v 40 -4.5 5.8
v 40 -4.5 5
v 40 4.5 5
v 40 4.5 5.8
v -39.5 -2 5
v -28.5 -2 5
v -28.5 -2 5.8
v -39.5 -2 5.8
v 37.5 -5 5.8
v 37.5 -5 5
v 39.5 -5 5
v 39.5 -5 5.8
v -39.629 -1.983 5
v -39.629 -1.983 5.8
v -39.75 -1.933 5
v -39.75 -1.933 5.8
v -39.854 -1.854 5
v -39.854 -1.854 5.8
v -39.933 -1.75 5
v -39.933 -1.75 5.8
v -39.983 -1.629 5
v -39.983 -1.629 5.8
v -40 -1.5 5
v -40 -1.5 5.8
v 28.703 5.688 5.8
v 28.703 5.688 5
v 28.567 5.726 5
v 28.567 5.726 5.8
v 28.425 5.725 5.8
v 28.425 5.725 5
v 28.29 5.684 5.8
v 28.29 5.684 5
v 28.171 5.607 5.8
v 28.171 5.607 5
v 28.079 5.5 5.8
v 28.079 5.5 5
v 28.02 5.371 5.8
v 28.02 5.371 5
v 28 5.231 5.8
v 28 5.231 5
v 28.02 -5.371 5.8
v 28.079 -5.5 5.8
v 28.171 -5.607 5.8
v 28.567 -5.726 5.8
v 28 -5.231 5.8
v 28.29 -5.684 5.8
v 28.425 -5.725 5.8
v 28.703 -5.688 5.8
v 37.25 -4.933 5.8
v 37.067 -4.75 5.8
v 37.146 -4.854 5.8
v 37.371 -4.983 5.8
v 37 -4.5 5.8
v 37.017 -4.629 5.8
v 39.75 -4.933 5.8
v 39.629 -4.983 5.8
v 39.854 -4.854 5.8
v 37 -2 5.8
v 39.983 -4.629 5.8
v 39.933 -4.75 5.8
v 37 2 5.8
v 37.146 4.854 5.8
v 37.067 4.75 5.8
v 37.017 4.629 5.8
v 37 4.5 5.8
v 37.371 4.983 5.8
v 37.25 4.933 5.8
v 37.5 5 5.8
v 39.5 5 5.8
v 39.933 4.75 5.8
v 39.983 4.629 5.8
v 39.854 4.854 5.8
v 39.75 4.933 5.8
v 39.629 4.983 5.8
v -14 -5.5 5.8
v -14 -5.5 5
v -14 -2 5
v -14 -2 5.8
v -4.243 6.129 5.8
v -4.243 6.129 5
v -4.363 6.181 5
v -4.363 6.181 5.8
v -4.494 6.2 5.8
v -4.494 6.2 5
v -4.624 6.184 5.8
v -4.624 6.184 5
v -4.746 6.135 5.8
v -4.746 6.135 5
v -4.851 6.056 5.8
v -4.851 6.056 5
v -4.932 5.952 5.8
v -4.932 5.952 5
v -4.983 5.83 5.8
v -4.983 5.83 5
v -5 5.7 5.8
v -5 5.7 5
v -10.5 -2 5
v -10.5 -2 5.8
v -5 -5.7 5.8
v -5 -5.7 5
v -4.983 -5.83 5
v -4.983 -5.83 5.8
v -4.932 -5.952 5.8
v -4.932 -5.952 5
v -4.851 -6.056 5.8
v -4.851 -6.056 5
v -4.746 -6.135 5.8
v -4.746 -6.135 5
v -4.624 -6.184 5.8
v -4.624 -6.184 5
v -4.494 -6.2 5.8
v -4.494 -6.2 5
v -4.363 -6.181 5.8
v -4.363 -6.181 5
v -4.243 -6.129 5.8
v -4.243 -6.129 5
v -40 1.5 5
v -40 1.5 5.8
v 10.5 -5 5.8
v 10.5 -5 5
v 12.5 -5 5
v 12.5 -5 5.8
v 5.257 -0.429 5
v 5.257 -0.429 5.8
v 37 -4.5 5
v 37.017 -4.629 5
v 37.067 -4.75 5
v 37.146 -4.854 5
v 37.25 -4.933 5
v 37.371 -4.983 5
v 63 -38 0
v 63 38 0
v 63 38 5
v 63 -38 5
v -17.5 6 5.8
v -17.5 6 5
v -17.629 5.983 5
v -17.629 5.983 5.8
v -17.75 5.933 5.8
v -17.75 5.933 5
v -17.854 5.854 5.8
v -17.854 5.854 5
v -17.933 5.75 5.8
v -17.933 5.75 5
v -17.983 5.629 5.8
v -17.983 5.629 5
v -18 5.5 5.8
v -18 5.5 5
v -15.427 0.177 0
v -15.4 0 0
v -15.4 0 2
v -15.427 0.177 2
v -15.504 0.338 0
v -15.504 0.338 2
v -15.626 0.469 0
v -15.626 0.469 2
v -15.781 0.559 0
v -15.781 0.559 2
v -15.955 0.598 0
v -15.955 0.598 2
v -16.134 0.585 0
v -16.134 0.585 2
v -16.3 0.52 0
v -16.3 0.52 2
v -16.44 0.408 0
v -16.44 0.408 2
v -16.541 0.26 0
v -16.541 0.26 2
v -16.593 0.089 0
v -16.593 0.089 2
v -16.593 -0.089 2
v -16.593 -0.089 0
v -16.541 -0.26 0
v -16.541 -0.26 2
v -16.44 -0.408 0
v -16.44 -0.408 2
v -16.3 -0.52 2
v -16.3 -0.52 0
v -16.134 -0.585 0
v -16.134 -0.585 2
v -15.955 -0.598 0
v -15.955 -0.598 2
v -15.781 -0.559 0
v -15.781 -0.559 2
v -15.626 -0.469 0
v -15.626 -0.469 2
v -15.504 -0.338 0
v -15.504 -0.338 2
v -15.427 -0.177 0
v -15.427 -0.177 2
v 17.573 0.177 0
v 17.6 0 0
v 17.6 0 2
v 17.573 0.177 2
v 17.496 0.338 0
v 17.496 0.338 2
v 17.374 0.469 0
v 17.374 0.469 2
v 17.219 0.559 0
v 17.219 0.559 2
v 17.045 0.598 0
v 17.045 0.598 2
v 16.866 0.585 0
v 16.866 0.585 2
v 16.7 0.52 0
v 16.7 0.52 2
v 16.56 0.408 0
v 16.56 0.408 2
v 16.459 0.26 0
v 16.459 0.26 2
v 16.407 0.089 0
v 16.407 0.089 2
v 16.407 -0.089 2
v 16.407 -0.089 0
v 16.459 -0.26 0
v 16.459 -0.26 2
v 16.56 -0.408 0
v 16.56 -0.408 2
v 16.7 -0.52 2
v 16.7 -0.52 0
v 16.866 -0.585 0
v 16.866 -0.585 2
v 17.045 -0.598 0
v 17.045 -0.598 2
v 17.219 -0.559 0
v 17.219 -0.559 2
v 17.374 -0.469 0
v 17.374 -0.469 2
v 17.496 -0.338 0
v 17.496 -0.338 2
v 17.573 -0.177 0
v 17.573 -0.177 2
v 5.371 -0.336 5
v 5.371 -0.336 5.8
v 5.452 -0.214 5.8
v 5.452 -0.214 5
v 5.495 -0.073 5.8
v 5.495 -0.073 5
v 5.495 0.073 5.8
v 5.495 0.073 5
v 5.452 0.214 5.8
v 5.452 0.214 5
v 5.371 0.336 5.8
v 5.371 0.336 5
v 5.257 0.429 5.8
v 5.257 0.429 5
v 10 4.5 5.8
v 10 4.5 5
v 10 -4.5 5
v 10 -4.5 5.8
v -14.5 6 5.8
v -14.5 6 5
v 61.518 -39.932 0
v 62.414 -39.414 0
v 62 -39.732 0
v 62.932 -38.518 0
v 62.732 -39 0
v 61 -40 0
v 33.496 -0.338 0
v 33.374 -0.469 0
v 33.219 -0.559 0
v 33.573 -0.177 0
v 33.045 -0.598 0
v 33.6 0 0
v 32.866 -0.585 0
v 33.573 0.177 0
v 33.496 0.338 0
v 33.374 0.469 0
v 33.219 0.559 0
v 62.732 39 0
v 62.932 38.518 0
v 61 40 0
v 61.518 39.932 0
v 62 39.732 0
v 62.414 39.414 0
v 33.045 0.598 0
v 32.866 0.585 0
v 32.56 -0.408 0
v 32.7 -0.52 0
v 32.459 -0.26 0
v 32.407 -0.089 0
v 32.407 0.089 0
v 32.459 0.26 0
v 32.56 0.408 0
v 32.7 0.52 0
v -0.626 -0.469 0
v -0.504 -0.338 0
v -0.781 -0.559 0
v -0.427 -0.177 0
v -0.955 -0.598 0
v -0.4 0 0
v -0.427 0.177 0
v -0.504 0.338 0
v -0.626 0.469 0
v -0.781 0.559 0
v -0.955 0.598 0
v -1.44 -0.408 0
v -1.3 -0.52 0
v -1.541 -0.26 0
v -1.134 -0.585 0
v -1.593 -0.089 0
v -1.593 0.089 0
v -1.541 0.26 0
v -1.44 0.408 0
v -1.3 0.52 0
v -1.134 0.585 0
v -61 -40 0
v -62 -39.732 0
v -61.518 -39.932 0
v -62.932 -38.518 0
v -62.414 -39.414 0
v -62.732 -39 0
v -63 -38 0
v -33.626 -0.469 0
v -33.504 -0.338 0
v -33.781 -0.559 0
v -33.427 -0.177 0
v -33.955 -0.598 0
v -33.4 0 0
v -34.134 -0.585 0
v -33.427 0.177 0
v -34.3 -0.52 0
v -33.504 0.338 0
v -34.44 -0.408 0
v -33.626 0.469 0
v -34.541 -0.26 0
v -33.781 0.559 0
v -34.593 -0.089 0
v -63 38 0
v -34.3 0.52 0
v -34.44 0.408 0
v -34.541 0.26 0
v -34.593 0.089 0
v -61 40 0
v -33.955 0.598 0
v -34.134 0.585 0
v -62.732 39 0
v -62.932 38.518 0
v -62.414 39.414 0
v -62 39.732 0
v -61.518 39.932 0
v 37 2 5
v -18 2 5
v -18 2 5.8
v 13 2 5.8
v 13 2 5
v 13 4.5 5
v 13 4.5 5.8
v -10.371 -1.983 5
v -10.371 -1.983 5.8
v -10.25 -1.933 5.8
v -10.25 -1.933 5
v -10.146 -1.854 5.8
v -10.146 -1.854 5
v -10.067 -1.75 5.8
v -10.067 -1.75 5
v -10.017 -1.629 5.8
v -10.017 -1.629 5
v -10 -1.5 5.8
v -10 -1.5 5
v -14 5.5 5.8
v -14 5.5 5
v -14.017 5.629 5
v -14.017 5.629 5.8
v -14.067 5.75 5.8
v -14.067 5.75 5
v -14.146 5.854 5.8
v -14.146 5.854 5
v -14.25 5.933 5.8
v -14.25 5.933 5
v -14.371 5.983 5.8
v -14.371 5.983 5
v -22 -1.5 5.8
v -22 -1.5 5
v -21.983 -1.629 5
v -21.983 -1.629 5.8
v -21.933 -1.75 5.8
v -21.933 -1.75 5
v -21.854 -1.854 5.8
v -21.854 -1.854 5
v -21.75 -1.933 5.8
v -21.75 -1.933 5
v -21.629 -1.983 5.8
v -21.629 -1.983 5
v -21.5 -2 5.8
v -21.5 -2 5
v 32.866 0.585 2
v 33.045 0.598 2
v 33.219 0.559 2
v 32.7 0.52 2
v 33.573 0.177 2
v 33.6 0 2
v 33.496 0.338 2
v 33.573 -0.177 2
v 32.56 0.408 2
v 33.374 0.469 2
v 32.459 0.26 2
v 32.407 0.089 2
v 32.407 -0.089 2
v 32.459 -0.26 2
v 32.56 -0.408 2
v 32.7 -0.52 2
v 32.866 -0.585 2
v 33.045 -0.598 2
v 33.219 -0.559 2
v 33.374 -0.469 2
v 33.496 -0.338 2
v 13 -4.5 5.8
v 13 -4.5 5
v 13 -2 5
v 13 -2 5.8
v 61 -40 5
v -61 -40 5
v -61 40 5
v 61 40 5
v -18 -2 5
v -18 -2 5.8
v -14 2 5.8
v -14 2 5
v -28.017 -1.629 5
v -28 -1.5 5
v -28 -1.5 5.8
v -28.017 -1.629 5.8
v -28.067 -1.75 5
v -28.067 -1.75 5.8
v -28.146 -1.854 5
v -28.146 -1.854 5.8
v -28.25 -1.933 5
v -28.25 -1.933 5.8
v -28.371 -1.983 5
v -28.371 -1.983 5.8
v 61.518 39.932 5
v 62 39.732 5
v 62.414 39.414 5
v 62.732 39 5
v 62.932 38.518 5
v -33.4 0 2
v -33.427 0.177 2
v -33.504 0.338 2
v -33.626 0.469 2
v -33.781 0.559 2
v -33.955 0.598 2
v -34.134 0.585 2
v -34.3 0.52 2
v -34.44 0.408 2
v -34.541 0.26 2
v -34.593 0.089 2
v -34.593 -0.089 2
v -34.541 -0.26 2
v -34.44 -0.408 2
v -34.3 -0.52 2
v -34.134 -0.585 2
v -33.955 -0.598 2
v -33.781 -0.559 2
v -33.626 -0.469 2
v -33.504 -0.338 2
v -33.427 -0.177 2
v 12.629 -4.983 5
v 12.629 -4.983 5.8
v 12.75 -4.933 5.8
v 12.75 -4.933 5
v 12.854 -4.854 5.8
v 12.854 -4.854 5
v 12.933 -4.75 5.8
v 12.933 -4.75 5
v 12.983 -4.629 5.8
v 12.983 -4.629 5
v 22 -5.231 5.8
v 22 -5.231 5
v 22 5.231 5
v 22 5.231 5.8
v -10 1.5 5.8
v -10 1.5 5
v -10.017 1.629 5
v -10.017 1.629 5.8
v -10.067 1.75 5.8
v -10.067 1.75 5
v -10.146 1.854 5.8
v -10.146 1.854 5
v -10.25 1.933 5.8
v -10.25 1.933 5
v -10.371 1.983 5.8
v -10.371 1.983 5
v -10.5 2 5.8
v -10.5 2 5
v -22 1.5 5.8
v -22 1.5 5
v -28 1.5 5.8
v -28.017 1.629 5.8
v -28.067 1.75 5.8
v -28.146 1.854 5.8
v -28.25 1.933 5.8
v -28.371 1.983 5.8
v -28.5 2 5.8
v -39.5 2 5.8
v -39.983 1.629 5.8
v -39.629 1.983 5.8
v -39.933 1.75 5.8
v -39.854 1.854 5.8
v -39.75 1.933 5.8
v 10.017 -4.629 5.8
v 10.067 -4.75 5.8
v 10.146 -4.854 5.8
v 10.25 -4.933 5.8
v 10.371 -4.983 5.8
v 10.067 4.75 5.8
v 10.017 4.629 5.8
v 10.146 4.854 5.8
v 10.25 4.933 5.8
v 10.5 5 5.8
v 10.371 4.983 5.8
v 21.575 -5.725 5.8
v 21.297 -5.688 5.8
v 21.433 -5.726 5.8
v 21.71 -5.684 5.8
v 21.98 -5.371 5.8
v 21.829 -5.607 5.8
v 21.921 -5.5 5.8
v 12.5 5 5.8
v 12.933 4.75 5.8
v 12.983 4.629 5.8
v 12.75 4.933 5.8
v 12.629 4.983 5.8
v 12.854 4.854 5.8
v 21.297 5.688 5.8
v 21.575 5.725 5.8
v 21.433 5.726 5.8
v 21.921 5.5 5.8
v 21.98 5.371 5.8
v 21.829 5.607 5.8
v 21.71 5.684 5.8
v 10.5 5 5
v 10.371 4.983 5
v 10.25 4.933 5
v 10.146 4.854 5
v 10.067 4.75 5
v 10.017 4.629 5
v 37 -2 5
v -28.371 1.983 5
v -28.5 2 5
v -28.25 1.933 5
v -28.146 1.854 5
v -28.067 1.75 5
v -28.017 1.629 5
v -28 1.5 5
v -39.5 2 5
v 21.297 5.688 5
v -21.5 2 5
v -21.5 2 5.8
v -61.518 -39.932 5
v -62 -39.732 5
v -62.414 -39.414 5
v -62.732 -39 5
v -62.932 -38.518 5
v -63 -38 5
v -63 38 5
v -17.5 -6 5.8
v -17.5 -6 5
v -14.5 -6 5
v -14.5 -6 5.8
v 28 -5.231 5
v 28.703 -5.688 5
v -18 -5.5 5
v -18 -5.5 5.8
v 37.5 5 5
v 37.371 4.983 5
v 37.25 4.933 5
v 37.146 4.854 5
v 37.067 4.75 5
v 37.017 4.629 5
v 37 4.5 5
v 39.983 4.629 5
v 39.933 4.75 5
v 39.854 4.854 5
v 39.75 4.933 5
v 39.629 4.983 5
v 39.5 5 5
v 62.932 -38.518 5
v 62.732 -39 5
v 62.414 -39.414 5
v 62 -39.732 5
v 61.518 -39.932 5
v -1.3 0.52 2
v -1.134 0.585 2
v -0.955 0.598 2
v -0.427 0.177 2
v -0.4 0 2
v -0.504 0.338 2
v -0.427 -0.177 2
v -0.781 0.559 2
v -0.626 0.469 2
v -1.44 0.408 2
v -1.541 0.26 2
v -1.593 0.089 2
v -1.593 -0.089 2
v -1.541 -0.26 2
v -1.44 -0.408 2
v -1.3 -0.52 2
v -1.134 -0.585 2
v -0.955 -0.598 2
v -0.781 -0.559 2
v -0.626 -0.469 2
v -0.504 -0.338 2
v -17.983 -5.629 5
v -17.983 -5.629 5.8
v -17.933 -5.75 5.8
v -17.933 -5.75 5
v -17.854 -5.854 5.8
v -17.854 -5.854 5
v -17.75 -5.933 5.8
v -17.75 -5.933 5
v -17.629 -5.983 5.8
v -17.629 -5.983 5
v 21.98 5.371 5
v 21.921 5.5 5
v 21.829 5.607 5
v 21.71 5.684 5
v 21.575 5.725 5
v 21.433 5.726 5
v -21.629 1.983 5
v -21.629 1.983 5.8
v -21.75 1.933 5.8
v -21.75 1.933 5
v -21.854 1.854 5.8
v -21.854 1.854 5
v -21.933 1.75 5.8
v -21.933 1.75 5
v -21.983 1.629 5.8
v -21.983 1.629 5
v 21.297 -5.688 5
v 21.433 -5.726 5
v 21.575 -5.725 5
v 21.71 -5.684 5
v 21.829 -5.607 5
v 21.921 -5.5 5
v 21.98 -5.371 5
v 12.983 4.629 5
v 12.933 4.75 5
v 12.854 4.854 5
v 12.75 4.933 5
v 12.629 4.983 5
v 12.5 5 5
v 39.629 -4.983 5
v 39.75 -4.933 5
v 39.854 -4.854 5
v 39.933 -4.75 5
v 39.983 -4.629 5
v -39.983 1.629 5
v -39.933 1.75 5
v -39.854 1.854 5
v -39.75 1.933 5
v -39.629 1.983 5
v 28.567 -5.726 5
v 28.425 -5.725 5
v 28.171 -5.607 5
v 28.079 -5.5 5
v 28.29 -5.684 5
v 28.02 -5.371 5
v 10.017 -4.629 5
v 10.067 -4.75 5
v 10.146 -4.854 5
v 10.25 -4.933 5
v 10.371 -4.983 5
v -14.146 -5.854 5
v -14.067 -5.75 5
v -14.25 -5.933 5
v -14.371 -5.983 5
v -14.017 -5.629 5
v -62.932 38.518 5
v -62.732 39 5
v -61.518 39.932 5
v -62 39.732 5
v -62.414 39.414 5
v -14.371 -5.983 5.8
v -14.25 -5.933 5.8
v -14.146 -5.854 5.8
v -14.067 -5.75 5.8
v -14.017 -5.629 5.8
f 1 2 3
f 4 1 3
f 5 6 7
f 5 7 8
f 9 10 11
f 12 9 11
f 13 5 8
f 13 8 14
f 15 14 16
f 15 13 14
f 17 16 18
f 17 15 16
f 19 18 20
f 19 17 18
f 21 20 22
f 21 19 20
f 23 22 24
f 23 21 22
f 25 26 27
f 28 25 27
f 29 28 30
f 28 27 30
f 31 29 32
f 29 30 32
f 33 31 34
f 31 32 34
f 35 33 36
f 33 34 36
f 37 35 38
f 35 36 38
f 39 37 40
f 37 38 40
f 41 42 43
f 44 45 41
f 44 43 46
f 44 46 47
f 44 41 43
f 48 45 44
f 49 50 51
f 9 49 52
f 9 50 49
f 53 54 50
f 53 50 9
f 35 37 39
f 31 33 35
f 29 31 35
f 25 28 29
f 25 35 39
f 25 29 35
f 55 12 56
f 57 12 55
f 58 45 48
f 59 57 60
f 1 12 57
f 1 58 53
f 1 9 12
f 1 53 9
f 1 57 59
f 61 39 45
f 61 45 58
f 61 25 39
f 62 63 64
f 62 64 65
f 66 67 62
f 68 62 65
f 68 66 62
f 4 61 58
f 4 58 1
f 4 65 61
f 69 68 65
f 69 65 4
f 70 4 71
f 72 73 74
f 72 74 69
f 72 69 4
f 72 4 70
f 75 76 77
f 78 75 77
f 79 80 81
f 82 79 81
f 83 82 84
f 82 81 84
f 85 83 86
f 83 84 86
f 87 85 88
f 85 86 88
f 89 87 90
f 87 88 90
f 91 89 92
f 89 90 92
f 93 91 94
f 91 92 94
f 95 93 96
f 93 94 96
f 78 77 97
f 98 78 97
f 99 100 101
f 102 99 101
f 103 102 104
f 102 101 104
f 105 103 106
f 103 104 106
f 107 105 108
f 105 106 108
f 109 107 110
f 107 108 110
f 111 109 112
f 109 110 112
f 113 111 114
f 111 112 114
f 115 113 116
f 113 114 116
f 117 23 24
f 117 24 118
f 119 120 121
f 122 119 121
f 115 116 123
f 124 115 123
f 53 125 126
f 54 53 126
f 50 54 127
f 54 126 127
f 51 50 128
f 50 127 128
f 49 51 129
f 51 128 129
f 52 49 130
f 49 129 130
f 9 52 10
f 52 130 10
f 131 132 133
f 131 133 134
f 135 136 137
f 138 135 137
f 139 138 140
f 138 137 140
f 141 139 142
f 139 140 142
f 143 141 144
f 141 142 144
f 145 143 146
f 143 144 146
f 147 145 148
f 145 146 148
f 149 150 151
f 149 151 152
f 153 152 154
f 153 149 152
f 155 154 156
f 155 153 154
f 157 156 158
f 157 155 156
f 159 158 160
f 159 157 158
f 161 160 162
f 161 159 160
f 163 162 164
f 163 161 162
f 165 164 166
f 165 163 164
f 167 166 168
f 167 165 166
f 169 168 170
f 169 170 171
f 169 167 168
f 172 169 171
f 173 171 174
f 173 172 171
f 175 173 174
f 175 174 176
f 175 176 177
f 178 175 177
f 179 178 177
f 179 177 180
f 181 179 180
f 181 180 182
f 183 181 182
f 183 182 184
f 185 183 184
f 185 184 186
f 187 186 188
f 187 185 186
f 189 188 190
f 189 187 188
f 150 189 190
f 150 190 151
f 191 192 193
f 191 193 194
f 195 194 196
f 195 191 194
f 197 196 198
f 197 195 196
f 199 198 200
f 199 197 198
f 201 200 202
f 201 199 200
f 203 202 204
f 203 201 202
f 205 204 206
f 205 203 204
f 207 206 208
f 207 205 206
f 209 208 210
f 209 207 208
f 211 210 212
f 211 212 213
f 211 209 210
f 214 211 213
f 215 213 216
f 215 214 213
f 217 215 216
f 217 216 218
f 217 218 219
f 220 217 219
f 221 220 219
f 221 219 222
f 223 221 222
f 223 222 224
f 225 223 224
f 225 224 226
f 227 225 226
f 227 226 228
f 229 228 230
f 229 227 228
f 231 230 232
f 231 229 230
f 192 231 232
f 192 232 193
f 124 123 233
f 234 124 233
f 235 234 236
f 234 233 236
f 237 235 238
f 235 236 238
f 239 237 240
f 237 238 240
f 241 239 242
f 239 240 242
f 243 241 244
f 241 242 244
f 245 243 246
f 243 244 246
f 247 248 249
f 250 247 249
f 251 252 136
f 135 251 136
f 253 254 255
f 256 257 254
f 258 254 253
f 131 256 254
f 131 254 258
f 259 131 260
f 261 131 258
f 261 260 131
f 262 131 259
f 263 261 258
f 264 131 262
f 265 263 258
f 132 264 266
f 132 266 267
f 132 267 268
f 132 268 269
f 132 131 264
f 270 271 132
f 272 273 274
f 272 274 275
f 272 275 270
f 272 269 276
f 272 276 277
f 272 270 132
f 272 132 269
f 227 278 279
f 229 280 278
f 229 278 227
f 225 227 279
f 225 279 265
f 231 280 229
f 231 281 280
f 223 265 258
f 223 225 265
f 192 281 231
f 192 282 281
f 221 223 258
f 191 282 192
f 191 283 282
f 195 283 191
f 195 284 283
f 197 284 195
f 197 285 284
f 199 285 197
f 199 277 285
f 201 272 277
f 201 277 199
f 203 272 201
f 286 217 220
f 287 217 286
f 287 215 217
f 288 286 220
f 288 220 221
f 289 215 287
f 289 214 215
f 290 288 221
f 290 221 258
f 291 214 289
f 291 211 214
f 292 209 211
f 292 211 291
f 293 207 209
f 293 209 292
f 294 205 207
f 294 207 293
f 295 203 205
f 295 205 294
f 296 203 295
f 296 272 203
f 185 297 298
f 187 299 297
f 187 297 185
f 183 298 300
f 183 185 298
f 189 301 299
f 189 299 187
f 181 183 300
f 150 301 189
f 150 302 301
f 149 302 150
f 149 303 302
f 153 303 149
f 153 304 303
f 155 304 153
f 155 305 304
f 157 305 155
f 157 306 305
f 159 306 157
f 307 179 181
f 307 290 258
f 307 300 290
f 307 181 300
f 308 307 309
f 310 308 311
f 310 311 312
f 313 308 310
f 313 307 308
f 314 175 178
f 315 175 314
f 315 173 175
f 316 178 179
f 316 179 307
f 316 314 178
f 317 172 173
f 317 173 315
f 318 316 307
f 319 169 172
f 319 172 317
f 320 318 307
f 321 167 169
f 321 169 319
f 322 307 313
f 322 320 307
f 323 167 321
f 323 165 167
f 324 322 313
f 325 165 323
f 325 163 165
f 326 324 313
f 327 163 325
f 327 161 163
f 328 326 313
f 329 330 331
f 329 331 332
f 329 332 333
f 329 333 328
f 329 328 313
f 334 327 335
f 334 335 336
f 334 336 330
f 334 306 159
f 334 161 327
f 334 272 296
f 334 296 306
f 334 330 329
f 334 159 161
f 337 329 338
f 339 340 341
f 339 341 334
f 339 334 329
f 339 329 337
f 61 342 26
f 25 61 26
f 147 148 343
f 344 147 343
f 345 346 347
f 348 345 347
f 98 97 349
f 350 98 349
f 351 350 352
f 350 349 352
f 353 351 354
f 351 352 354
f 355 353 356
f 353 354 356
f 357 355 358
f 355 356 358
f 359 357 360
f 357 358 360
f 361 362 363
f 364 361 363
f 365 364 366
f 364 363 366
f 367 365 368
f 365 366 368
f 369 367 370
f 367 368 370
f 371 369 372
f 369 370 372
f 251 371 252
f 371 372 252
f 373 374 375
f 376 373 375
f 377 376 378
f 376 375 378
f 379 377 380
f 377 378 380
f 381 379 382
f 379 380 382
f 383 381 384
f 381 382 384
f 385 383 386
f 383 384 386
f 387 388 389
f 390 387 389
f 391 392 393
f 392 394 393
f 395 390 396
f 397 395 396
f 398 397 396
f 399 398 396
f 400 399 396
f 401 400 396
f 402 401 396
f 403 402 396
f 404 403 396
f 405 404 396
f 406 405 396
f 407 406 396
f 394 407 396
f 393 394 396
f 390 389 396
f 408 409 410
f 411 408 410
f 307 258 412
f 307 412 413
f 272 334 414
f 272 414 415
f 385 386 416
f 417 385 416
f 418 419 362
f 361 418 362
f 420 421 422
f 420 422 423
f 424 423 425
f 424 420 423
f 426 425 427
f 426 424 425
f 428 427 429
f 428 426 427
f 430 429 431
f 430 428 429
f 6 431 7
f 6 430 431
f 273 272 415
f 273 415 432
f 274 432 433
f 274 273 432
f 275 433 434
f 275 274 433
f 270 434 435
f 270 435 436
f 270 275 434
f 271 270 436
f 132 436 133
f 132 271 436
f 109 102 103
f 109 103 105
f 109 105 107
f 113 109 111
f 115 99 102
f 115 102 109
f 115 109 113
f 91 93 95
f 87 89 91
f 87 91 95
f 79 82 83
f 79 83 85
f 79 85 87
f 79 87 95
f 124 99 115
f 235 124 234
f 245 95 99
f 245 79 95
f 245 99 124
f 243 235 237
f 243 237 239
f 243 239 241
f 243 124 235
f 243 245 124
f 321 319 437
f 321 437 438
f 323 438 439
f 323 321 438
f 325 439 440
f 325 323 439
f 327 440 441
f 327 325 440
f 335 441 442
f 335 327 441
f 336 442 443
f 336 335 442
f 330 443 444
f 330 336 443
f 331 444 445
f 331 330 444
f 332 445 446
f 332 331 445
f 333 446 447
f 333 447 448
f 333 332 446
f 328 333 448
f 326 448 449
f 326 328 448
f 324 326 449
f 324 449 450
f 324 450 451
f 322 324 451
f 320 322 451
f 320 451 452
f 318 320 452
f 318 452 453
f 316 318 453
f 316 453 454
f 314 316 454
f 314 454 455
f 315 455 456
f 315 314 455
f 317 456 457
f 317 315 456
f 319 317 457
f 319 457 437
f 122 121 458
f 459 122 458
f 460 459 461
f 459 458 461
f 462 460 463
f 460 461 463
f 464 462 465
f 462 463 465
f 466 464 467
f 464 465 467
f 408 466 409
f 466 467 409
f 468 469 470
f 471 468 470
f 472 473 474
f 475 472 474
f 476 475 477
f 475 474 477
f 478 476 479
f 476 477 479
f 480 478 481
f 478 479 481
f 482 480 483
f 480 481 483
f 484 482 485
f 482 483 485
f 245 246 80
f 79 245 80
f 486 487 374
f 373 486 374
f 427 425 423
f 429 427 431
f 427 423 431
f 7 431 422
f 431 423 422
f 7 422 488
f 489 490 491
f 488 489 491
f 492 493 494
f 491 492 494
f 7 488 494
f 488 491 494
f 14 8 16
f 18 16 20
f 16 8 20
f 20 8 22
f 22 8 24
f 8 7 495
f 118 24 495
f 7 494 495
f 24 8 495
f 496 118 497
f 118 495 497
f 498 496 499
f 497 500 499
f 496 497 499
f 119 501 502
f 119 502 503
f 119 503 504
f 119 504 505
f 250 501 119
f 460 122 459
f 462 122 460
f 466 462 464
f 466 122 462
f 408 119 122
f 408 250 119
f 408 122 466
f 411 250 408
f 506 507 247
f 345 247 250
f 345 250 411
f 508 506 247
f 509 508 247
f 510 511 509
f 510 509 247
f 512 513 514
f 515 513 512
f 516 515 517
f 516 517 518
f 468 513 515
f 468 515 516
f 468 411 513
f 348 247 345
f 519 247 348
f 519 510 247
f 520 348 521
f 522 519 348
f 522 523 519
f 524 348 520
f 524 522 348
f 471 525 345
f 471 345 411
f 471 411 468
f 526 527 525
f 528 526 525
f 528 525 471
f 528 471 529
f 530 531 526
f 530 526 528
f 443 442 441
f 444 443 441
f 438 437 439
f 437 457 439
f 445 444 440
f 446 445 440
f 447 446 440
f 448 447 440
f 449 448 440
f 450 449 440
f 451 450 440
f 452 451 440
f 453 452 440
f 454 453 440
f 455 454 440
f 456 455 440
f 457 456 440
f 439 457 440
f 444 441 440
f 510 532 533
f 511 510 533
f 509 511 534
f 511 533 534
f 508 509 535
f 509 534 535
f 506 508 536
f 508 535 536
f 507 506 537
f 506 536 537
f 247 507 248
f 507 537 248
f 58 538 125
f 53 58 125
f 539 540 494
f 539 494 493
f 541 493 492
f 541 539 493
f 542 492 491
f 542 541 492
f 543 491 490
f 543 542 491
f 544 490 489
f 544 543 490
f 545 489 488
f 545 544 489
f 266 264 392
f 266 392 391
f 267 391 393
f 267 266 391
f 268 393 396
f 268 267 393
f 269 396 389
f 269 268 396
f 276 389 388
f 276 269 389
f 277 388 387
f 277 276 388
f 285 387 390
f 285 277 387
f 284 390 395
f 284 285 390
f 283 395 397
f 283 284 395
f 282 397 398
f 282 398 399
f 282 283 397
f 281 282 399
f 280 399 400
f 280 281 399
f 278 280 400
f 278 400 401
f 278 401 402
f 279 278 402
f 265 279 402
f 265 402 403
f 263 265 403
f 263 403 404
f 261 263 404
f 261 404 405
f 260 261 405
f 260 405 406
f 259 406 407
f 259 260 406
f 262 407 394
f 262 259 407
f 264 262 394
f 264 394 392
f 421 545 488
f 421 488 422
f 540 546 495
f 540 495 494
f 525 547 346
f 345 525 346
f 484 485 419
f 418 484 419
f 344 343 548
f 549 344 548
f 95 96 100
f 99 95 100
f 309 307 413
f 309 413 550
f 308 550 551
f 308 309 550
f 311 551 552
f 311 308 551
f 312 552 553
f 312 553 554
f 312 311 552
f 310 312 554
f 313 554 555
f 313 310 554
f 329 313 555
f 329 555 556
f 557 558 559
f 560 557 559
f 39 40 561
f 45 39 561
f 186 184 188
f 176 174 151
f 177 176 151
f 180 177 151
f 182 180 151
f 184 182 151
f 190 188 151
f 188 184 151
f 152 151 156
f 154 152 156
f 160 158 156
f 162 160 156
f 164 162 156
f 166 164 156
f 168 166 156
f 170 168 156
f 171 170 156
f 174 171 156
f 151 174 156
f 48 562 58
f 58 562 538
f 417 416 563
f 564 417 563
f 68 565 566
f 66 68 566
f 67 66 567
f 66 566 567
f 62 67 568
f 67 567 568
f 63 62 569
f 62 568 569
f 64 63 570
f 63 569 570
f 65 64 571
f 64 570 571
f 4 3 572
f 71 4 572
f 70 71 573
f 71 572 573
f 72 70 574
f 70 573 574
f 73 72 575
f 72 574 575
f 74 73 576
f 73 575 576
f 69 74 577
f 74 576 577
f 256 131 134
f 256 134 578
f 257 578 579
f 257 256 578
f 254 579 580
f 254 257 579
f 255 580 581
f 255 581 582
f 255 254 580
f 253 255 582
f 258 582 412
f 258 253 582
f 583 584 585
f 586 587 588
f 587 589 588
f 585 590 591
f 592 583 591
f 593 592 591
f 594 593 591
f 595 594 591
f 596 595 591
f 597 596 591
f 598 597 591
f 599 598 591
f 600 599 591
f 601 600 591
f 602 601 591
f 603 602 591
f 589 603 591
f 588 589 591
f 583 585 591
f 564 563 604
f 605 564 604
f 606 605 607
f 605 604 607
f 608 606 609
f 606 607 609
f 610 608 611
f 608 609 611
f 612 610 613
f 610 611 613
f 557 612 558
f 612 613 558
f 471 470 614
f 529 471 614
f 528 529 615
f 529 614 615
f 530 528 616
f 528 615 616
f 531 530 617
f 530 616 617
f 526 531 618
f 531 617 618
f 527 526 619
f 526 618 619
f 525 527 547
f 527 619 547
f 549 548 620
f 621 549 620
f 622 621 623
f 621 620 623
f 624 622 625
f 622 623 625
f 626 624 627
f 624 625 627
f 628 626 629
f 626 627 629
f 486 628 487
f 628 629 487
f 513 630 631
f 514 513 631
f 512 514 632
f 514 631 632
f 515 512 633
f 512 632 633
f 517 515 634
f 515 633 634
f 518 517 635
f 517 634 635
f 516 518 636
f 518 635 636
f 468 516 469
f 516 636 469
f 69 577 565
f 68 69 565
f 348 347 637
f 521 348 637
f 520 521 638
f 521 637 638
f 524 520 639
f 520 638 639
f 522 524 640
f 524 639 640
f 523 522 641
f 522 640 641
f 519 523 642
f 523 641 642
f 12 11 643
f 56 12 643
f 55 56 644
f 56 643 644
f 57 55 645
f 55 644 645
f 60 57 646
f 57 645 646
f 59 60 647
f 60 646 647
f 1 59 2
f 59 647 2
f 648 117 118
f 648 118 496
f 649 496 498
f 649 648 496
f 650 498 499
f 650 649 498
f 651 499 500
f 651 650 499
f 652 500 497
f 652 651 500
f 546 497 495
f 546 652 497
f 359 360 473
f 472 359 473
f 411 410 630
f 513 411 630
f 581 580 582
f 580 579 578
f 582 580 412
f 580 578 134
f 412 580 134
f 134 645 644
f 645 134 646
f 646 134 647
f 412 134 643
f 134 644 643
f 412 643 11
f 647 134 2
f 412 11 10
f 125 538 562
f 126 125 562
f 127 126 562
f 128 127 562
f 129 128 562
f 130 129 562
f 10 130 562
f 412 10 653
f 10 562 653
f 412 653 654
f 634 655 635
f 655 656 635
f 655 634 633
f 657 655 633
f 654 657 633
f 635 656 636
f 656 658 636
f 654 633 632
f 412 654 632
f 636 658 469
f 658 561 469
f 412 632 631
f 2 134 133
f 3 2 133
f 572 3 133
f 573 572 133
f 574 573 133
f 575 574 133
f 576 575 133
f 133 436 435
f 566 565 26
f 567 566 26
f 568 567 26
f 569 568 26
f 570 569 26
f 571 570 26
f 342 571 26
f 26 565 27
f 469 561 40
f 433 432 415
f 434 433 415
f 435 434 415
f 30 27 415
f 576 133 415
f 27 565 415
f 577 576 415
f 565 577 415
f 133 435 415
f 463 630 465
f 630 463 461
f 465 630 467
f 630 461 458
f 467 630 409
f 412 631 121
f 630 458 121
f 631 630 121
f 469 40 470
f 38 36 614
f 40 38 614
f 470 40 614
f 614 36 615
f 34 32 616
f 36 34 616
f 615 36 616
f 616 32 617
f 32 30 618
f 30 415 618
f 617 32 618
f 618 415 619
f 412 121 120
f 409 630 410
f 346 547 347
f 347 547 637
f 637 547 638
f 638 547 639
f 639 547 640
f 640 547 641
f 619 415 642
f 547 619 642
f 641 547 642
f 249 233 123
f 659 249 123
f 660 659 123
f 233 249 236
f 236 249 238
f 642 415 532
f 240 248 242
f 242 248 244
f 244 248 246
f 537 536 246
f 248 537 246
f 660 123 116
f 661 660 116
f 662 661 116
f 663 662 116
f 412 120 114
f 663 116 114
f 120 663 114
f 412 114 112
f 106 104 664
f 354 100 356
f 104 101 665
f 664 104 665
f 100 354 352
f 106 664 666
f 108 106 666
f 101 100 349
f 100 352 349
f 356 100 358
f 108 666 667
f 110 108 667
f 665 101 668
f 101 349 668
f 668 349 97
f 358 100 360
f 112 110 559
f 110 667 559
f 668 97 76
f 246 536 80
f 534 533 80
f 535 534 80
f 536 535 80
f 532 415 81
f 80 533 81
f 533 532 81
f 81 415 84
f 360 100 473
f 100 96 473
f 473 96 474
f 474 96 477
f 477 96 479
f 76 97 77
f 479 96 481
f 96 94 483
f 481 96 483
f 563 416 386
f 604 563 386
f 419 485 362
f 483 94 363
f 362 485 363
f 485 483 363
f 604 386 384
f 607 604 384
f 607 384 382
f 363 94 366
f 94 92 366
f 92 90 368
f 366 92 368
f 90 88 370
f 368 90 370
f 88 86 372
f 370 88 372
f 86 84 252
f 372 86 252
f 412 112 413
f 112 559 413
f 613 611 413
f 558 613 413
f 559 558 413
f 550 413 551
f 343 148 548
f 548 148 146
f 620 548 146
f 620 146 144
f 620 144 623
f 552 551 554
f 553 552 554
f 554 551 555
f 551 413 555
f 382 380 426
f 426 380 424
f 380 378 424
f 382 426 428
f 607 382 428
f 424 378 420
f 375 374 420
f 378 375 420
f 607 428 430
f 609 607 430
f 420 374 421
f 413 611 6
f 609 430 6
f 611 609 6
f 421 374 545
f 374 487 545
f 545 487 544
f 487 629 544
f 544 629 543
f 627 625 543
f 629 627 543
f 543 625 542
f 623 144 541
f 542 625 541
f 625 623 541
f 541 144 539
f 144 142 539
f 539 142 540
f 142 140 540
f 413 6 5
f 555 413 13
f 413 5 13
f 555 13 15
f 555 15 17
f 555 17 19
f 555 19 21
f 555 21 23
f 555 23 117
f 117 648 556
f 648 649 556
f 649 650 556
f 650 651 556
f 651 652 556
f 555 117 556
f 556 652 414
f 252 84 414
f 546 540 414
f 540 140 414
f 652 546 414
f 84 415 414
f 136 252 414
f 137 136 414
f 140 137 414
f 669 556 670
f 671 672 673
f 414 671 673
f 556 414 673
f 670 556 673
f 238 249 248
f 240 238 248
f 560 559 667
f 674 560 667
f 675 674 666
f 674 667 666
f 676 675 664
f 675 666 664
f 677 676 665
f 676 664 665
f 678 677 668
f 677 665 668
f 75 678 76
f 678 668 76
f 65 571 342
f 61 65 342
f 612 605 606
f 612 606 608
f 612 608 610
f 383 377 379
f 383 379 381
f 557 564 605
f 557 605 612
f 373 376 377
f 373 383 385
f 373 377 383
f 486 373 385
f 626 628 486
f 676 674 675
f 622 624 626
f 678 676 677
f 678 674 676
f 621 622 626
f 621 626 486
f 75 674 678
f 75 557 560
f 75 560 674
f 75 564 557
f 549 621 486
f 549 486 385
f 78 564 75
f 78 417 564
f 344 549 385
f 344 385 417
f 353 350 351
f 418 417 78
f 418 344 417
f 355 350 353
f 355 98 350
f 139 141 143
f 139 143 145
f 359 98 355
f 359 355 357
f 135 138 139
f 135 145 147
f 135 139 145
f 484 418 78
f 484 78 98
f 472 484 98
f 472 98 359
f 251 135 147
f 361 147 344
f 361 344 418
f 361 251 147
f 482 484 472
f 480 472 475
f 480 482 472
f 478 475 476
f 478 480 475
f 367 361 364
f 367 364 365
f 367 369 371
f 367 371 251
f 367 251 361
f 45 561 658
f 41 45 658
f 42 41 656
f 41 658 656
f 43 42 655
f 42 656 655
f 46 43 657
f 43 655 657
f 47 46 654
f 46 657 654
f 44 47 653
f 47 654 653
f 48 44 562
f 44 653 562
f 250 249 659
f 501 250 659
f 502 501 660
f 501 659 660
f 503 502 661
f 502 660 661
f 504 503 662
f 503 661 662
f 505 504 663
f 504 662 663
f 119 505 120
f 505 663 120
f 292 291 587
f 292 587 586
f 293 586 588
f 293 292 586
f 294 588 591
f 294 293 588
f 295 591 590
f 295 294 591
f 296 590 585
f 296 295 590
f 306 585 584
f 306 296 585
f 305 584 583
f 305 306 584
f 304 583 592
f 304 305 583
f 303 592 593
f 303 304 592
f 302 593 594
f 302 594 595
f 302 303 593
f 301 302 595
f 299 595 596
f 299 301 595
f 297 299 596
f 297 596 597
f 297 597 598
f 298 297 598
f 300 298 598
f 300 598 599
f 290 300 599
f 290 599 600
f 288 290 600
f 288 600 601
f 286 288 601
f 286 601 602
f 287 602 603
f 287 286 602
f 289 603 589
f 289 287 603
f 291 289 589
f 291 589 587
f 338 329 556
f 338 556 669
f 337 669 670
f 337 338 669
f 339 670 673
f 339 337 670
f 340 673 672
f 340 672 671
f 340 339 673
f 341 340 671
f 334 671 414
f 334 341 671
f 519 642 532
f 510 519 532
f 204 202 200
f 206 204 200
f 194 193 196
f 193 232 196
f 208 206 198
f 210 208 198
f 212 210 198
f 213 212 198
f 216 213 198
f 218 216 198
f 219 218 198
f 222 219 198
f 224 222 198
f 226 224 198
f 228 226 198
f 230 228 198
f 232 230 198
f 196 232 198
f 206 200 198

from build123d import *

# Parameters (mm, degrees)
BOSS_EXTRUDE1_DEPTH = 5
BOSS_EXTRUDE2_DEPTH = 0.8
SKETCH22_R          = 0.6
CUT_EXTRUDE1_DEPTH  = 2


with BuildPart() as part:
    # Sketch1 → Boss-Extrude1 (new body)
    with BuildSketch(Plane.XY):
        with BuildLine():
            Line((-61, 40), (61, 40))
            ThreePointArc((61, 40), (62.414213562, 39.414213562), (63, 38))
            Line((63, 38), (63, -38))
            ThreePointArc((63, -38), (62.414213562, -39.414213562), (61, -40))
            Line((61, -40), (-61, -40))
            ThreePointArc((-61, -40), (-62.414213562, -39.414213562), (-63, -38))
            Line((-63, -38), (-63, 38))
            ThreePointArc((-63, 38), (-62.414213562, 39.414213562), (-61, 40))
        make_face()
    extrude(amount=BOSS_EXTRUDE1_DEPTH)

    # Sketch19 → Boss-Extrude2 (add)
    with BuildSketch(Plane.XY.offset(5)):
        with BuildLine():
            Line((-5, 5.7), (-5, -5.7))
            ThreePointArc((-5, -5.7), (-4.746349407, -6.135099953), (-4.242752122, -6.128746463))
            Line((-4.242752122, -6.128746463), (5.257247878, -0.428746463))
            ThreePointArc((5.257247878, -0.428746463), (5.5, 0), (5.257247878, 0.428746463))
            Line((5.257247878, 0.428746463), (-4.242752122, 6.128746463))
            ThreePointArc((-4.242752122, 6.128746463), (-4.746349407, 6.135099953), (-5, 5.7))
        make_face()
        with BuildLine():
            Line((-10, -1.5), (-10, 1.5))
            ThreePointArc((-10, 1.5), (-10.146446609, 1.853553391), (-10.5, 2))
            Line((-10.5, 2), (-14, 2))
            Line((-14, 2), (-14, 5.5))
            ThreePointArc((-14, 5.5), (-14.146446609, 5.853553391), (-14.5, 6))
            Line((-14.5, 6), (-17.5, 6))
            ThreePointArc((-17.5, 6), (-17.853553391, 5.853553391), (-18, 5.5))
            Line((-18, 5.5), (-18, 2))
            Line((-18, 2), (-21.5, 2))
            ThreePointArc((-21.5, 2), (-21.853553391, 1.853553391), (-22, 1.5))
            Line((-22, 1.5), (-22, -1.5))
            ThreePointArc((-22, -1.5), (-21.853553391, -1.853553391), (-21.5, -2))
            Line((-21.5, -2), (-18, -2))
            Line((-18, -2), (-18, -5.5))
            ThreePointArc((-18, -5.5), (-17.853553391, -5.853553391), (-17.5, -6))
            Line((-17.5, -6), (-14.5, -6))
            ThreePointArc((-14.5, -6), (-14.146446609, -5.853553391), (-14, -5.5))
            Line((-14, -5.5), (-14, -2))
            Line((-14, -2), (-10.5, -2))
            ThreePointArc((-10.5, -2), (-10.146446609, -1.853553391), (-10, -1.5))
        make_face()
        with BuildLine():
            Line((-28, 1.5), (-28, -1.5))
            ThreePointArc((-28, -1.5), (-28.146446609, -1.853553391), (-28.5, -2))
            Line((-28.5, -2), (-39.5, -2))
            ThreePointArc((-39.5, -2), (-39.853553391, -1.853553391), (-40, -1.5))
            Line((-40, -1.5), (-40, 1.5))
            ThreePointArc((-40, 1.5), (-39.853553391, 1.853553391), (-39.5, 2))
            Line((-39.5, 2), (-28.5, 2))
            ThreePointArc((-28.5, 2), (-28.146446609, 1.853553391), (-28, 1.5))
        make_face()
        with BuildLine():
            Line((10, 4.5), (10, -4.5))
            ThreePointArc((10, -4.5), (10.146446609, -4.853553391), (10.5, -5))
            Line((10.5, -5), (12.5, -5))
            ThreePointArc((12.5, -5), (12.853553391, -4.853553391), (13, -4.5))
            Line((13, -4.5), (13, -2))
            Line((13, -2), (21.296930767, -5.687524785))
            ThreePointArc((21.296930767, -5.687524785), (21.77245677, -5.64986513), (22, -5.230619011))
            Line((22, -5.230619011), (22, 5.230619011))
            ThreePointArc((22, 5.230619011), (21.77245677, 5.64986513), (21.296930767, 5.687524785))
            Line((21.296930767, 5.687524785), (13, 2))
            Line((13, 2), (13, 4.5))
            ThreePointArc((13, 4.5), (12.853553391, 4.853553391), (12.5, 5))
            Line((12.5, 5), (10.5, 5))
            ThreePointArc((10.5, 5), (10.146446609, 4.853553391), (10, 4.5))
        make_face()
        with BuildLine():
            Line((28, 5.230619011), (28, -5.230619011))
            ThreePointArc((28, -5.230619011), (28.22754323, -5.64986513), (28.703069233, -5.687524785))
            Line((28.703069233, -5.687524785), (37, -2))
            Line((37, -2), (37, -4.5))
            ThreePointArc((37, -4.5), (37.146446609, -4.853553391), (37.5, -5))
            Line((37.5, -5), (39.5, -5))
            ThreePointArc((39.5, -5), (39.853553391, -4.853553391), (40, -4.5))
            Line((40, -4.5), (40, 4.5))
            ThreePointArc((40, 4.5), (39.853553391, 4.853553391), (39.5, 5))
            Line((39.5, 5), (37.5, 5))
            ThreePointArc((37.5, 5), (37.146446609, 4.853553391), (37, 4.5))
            Line((37, 4.5), (37, 2))
            Line((37, 2), (28.703069233, 5.687524785))
            ThreePointArc((28.703069233, 5.687524785), (28.22754323, 5.64986513), (28, 5.230619011))
        make_face()
    extrude(amount=BOSS_EXTRUDE2_DEPTH)

    # Sketch22 → Cut-Extrude1 (cut)
    with BuildSketch(Plane.XY):
        with Locations((-34, 0)):
            Circle(SKETCH22_R)
        with Locations((-16, 0)):
            Circle(SKETCH22_R)
        with Locations((-1, 0)):
            Circle(SKETCH22_R)
        with Locations((17, 0)):
            Circle(SKETCH22_R)
        with Locations((33, 0)):
            Circle(SKETCH22_R)
    extrude(amount=CUT_EXTRUDE1_DEPTH, mode=Mode.SUBTRACT)


solid = part.part
